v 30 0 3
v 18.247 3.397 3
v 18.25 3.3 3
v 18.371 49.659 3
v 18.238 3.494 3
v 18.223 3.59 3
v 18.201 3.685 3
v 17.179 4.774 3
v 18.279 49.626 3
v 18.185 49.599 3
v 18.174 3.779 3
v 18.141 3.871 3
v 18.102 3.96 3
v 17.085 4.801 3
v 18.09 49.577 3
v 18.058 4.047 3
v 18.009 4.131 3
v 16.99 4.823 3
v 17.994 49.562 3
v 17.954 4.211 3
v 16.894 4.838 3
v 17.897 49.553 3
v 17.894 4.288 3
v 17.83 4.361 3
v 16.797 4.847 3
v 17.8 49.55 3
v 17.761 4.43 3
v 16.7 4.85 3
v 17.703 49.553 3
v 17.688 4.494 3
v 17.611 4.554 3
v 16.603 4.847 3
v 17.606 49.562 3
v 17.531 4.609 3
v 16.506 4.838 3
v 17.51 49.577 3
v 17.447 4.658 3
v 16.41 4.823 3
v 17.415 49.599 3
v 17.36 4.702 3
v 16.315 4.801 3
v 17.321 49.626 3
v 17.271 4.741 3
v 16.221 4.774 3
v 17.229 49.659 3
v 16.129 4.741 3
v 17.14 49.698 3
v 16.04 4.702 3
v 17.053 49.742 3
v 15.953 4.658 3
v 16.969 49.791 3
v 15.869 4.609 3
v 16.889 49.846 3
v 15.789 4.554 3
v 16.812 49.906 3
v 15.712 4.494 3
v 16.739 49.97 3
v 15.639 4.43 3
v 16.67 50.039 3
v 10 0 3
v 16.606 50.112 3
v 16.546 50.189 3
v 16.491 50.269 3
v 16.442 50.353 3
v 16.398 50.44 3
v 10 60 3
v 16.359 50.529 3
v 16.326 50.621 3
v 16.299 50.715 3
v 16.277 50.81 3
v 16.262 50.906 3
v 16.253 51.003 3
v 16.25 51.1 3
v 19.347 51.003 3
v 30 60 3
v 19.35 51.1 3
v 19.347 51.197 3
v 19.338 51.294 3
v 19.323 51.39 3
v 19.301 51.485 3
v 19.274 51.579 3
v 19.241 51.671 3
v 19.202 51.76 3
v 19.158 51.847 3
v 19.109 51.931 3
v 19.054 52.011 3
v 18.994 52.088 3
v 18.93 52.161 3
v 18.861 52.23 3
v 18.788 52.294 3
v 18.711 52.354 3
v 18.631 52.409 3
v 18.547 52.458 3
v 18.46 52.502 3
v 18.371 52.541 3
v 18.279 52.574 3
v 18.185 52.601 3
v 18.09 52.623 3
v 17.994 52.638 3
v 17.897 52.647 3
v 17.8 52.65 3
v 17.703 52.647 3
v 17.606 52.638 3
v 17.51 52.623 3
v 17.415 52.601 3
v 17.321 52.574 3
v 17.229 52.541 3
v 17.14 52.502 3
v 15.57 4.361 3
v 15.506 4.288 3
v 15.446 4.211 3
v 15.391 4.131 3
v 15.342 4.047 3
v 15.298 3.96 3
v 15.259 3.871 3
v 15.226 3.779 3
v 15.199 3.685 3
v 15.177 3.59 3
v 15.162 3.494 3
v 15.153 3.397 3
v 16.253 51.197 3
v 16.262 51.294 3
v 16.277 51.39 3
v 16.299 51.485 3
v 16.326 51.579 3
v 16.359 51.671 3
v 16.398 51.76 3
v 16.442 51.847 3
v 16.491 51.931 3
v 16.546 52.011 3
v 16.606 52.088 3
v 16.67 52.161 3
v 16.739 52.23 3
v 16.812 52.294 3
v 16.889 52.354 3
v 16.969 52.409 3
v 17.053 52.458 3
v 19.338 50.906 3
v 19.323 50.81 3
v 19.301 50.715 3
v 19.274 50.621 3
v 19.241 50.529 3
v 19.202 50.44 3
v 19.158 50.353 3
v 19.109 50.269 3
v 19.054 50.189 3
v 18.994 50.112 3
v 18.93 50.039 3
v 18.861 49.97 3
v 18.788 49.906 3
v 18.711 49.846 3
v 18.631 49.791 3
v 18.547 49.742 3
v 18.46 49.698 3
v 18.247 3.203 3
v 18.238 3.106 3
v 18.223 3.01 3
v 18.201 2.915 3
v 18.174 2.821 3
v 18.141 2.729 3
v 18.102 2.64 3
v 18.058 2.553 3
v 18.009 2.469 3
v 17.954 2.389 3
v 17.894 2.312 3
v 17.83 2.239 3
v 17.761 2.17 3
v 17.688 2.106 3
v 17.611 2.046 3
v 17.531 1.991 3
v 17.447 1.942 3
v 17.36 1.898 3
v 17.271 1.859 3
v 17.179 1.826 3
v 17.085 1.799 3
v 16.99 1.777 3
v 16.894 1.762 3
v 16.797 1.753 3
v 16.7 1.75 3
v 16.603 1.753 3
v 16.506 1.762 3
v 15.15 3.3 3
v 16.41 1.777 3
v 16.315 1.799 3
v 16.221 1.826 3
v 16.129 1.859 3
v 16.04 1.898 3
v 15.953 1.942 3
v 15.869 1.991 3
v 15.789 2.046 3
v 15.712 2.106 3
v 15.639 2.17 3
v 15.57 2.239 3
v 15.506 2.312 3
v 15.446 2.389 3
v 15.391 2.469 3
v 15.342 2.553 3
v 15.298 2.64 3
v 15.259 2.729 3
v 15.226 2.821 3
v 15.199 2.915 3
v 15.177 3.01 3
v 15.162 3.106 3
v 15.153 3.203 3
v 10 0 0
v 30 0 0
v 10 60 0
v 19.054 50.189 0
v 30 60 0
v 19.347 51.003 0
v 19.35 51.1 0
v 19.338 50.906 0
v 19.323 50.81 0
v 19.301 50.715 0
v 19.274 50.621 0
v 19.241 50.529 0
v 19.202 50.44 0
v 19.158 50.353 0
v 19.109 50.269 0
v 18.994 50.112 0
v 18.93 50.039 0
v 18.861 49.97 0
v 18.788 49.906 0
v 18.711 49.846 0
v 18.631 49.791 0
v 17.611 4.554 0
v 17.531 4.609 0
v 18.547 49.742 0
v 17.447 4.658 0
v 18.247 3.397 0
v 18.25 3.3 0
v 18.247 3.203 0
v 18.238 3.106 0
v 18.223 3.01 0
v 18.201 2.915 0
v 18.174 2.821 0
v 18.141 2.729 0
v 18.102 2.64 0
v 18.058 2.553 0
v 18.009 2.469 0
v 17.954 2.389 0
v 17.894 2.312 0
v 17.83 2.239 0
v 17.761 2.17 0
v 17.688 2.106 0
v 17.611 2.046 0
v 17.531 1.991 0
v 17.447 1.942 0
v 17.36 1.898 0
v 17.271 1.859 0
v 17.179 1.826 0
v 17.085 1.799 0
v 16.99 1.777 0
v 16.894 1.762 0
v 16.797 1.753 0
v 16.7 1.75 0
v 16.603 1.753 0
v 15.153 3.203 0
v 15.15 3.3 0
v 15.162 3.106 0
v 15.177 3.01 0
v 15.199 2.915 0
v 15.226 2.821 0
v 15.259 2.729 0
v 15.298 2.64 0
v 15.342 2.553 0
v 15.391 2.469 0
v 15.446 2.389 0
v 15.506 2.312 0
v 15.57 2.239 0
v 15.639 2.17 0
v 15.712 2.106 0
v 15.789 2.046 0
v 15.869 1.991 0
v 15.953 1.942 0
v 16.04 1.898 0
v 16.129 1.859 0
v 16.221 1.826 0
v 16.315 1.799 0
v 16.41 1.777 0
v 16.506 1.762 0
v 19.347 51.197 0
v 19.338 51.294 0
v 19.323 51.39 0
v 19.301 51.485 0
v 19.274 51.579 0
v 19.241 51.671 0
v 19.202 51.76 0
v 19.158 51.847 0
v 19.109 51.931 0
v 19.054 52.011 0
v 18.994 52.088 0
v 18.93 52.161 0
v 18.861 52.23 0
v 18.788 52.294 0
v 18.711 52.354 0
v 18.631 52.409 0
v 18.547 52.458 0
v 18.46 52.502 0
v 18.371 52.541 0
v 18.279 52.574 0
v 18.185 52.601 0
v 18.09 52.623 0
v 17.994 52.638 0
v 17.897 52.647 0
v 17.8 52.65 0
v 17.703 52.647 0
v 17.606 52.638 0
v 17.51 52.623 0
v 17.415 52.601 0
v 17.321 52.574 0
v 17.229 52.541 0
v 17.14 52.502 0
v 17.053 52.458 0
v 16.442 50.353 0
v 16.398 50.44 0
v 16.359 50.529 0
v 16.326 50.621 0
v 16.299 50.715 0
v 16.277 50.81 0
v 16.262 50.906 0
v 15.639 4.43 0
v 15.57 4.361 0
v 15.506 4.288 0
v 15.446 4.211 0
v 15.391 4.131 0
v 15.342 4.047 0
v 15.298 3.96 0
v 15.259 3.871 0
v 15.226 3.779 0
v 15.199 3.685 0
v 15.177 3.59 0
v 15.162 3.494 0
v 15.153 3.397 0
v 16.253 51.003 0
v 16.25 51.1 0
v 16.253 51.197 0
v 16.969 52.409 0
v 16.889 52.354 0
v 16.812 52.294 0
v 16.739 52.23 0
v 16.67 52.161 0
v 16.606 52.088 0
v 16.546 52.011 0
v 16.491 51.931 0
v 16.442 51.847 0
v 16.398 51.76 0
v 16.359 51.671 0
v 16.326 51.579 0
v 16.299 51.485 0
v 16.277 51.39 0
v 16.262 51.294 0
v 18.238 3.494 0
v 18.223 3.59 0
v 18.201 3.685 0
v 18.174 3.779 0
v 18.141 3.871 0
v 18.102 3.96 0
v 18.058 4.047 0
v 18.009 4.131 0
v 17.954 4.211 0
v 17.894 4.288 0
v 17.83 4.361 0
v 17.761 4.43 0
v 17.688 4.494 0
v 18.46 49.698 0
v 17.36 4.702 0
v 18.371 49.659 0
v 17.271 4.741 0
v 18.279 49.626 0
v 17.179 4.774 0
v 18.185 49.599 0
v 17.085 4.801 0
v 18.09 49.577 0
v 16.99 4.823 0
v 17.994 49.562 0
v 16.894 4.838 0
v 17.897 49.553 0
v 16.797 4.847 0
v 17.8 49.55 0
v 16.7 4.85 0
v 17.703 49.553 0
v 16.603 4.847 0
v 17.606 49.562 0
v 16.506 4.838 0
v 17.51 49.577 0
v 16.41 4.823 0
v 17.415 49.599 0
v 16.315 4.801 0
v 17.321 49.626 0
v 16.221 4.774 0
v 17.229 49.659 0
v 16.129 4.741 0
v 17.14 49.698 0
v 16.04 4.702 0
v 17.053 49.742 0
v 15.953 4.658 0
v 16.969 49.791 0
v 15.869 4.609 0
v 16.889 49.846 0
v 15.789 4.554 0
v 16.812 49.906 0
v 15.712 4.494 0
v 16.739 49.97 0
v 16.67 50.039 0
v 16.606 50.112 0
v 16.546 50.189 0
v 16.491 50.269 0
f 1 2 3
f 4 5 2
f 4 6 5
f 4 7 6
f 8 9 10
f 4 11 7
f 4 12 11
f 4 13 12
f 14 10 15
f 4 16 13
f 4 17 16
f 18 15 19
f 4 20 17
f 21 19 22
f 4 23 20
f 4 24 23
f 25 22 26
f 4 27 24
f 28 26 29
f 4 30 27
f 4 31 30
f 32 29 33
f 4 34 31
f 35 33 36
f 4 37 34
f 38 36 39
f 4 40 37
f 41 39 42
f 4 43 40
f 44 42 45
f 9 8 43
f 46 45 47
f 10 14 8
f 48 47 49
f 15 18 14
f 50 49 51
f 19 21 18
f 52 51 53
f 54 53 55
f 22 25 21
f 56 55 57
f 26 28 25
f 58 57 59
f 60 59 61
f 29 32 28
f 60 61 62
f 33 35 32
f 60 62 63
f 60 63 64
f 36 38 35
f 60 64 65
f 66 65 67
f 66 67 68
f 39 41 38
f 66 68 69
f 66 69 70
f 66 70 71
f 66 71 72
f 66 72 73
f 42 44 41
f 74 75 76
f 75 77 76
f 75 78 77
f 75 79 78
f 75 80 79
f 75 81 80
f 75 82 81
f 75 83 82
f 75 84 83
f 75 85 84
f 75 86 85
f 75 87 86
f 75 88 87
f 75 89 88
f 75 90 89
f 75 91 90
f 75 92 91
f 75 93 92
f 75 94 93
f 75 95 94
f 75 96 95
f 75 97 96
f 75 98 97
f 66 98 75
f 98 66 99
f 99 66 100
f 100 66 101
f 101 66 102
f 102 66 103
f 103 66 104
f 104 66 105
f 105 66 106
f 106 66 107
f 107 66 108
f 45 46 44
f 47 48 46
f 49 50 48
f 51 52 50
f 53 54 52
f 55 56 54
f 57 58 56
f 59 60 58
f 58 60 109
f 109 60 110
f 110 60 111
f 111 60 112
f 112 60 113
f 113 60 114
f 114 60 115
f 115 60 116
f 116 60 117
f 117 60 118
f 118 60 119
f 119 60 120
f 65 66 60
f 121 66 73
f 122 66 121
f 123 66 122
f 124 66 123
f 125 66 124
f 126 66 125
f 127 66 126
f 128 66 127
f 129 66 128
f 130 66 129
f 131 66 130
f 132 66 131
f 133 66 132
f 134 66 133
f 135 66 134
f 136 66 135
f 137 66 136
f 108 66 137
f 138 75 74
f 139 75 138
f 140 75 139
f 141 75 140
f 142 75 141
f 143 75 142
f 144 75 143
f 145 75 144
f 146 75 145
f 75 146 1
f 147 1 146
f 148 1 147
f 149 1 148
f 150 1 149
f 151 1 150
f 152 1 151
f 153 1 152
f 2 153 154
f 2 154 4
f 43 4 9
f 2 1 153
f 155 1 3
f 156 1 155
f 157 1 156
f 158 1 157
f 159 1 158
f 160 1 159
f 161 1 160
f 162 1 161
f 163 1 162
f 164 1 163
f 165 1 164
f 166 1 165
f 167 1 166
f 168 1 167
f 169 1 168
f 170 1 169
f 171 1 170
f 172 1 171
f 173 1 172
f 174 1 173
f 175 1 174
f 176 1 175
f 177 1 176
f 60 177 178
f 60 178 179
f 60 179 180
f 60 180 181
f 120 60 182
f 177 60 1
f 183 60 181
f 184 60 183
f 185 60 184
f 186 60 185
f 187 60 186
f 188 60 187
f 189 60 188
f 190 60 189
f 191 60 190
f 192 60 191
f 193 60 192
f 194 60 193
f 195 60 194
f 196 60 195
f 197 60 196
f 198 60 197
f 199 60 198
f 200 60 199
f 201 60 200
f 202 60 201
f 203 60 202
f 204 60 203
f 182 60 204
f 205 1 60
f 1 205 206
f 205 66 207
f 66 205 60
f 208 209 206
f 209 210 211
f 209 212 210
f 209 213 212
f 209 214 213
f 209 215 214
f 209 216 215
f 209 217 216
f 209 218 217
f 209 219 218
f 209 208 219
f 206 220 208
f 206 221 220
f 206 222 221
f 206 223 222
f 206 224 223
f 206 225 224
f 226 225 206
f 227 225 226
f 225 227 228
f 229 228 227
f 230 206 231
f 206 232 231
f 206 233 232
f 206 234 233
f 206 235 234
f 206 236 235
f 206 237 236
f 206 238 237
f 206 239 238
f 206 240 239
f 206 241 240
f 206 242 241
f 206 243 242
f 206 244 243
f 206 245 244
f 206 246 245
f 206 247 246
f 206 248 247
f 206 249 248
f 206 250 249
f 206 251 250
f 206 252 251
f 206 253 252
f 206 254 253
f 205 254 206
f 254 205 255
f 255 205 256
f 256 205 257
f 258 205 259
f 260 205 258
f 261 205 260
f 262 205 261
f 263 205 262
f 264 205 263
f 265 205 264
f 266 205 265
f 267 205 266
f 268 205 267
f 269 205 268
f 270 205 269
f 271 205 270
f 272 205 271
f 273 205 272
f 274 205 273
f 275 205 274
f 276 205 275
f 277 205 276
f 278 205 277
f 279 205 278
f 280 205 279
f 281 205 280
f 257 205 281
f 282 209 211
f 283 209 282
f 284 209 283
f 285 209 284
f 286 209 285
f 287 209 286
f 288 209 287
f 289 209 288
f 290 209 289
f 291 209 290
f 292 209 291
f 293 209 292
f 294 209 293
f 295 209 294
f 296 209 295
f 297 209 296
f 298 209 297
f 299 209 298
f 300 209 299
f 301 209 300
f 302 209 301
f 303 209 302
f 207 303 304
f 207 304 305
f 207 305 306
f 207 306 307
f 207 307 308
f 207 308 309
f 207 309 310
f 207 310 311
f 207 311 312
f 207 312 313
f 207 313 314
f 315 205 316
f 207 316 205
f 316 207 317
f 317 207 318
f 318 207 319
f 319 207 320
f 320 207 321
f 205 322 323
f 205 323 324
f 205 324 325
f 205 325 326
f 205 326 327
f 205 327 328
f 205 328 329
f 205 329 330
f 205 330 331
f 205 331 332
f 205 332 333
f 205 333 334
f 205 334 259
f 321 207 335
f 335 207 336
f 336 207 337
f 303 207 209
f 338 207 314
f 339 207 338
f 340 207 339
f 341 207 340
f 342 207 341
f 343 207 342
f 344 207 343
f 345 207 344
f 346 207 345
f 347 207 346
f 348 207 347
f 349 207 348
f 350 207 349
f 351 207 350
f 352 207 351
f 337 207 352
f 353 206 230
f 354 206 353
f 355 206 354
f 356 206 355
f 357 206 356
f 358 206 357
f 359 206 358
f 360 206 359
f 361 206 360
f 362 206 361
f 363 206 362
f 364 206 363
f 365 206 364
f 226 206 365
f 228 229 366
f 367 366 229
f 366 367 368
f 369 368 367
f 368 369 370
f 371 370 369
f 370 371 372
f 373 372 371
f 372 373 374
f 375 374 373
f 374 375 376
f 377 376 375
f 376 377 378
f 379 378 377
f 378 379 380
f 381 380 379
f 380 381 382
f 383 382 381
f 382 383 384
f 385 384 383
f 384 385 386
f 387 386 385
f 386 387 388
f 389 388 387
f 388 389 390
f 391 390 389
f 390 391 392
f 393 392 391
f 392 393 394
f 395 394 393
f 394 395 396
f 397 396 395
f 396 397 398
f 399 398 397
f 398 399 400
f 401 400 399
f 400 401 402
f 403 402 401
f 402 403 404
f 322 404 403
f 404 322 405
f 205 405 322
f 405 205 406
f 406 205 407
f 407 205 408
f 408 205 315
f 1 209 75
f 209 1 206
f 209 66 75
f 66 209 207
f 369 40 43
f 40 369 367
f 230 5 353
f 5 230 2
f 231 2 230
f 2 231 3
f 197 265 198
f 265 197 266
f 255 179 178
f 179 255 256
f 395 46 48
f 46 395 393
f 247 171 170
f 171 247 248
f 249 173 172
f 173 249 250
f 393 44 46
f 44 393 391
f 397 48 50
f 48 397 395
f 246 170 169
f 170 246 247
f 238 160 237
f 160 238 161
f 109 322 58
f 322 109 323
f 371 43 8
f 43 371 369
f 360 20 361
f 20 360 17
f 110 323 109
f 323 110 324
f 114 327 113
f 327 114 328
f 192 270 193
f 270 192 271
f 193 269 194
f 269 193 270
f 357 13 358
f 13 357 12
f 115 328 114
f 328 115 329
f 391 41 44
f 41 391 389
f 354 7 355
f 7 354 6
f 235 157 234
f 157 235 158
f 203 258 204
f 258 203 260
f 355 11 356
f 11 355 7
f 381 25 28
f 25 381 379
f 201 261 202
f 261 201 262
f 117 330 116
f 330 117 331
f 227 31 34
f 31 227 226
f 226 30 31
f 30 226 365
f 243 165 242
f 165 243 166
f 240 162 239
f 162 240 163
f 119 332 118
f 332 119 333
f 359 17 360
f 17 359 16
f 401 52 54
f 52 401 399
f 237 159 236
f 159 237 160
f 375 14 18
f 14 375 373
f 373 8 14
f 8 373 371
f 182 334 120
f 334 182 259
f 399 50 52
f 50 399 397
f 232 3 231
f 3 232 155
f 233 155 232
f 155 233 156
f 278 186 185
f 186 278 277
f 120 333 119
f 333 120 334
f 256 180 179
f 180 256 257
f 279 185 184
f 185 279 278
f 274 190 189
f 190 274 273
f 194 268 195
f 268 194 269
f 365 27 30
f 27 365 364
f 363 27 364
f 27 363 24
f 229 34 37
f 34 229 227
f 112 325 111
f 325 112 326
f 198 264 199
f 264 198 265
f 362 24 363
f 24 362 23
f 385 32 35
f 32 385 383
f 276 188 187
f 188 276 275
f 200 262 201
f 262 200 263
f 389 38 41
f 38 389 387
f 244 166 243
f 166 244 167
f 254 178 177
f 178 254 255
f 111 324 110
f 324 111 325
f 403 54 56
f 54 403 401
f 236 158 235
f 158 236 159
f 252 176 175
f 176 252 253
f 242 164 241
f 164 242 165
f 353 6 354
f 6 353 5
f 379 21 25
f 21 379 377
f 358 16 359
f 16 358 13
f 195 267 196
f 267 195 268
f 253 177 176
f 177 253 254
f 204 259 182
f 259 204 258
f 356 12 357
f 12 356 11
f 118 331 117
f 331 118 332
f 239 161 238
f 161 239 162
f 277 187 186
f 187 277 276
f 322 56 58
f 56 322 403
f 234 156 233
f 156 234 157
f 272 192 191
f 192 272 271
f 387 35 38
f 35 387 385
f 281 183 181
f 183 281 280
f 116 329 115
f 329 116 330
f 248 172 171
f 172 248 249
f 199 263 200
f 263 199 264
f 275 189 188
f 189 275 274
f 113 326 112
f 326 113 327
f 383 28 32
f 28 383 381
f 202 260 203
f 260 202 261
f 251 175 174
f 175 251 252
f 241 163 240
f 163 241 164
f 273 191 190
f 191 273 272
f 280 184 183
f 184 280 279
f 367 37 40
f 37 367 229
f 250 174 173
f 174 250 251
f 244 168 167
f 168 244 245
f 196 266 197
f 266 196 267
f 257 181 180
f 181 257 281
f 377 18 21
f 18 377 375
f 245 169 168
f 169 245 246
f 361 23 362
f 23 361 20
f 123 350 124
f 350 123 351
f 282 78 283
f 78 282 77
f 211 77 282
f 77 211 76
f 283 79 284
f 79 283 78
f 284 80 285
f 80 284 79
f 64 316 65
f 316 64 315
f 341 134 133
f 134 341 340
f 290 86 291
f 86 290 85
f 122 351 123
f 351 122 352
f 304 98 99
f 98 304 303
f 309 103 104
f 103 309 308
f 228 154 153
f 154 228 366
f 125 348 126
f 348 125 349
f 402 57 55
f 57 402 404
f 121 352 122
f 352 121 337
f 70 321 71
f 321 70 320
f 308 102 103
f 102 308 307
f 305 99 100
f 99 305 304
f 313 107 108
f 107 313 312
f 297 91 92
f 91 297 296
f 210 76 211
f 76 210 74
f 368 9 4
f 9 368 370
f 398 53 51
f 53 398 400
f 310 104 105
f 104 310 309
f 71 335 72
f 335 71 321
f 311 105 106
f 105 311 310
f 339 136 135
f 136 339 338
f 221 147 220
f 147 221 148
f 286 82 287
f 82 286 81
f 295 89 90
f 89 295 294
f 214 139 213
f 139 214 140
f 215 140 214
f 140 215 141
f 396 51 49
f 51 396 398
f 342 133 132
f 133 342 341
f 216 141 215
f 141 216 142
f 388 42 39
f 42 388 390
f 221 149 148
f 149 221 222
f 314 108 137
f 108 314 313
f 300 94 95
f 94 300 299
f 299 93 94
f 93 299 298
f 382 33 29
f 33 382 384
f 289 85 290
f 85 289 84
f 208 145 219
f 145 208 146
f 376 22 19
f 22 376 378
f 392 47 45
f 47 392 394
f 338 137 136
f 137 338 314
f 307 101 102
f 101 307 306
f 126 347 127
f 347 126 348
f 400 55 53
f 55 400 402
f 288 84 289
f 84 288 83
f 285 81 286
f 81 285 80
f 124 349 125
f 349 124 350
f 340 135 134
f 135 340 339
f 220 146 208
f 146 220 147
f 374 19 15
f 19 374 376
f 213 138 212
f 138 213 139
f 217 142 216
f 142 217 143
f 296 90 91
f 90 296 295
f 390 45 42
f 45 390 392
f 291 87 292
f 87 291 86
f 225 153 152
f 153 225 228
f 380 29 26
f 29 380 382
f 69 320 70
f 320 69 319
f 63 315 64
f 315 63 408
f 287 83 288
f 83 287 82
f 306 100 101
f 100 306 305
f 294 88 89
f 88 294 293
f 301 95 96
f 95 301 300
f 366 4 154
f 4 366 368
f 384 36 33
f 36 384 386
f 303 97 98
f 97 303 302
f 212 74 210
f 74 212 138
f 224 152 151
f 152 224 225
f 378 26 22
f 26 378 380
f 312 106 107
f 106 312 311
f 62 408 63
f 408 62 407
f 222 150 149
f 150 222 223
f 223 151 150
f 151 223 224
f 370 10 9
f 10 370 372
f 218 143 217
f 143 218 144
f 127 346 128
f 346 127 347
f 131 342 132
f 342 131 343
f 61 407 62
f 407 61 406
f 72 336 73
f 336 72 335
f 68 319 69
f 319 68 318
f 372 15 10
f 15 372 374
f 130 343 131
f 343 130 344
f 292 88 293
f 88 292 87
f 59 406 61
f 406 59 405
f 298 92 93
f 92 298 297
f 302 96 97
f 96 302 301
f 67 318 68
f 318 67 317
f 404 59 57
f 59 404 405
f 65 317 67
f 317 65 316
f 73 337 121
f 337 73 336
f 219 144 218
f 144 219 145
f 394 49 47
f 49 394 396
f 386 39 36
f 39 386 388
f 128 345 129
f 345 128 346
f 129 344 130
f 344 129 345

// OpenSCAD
$fn = 100;

bolt_d = 3.1;
w=20;
l=80;
h=3;

d=60;

x1=74.8 - 51.9-6.2;
y1=3.3;

x2=x1+51.9;
y2=y1+4.7;

x3=x2;
y3=y2+27.9;
x4=x1+1.1;
y4=y3+15.2;


    difference(){
        rotate([0,0,90])
        translate([0,-w-10,0])
        cube([d,w,h]);
        
        translate([x1,y1,-h])
        cylinder(3*h, d=3.1);
        
        translate([x4,y4,-h])
        cylinder(3*h, d=3.1);
    }
